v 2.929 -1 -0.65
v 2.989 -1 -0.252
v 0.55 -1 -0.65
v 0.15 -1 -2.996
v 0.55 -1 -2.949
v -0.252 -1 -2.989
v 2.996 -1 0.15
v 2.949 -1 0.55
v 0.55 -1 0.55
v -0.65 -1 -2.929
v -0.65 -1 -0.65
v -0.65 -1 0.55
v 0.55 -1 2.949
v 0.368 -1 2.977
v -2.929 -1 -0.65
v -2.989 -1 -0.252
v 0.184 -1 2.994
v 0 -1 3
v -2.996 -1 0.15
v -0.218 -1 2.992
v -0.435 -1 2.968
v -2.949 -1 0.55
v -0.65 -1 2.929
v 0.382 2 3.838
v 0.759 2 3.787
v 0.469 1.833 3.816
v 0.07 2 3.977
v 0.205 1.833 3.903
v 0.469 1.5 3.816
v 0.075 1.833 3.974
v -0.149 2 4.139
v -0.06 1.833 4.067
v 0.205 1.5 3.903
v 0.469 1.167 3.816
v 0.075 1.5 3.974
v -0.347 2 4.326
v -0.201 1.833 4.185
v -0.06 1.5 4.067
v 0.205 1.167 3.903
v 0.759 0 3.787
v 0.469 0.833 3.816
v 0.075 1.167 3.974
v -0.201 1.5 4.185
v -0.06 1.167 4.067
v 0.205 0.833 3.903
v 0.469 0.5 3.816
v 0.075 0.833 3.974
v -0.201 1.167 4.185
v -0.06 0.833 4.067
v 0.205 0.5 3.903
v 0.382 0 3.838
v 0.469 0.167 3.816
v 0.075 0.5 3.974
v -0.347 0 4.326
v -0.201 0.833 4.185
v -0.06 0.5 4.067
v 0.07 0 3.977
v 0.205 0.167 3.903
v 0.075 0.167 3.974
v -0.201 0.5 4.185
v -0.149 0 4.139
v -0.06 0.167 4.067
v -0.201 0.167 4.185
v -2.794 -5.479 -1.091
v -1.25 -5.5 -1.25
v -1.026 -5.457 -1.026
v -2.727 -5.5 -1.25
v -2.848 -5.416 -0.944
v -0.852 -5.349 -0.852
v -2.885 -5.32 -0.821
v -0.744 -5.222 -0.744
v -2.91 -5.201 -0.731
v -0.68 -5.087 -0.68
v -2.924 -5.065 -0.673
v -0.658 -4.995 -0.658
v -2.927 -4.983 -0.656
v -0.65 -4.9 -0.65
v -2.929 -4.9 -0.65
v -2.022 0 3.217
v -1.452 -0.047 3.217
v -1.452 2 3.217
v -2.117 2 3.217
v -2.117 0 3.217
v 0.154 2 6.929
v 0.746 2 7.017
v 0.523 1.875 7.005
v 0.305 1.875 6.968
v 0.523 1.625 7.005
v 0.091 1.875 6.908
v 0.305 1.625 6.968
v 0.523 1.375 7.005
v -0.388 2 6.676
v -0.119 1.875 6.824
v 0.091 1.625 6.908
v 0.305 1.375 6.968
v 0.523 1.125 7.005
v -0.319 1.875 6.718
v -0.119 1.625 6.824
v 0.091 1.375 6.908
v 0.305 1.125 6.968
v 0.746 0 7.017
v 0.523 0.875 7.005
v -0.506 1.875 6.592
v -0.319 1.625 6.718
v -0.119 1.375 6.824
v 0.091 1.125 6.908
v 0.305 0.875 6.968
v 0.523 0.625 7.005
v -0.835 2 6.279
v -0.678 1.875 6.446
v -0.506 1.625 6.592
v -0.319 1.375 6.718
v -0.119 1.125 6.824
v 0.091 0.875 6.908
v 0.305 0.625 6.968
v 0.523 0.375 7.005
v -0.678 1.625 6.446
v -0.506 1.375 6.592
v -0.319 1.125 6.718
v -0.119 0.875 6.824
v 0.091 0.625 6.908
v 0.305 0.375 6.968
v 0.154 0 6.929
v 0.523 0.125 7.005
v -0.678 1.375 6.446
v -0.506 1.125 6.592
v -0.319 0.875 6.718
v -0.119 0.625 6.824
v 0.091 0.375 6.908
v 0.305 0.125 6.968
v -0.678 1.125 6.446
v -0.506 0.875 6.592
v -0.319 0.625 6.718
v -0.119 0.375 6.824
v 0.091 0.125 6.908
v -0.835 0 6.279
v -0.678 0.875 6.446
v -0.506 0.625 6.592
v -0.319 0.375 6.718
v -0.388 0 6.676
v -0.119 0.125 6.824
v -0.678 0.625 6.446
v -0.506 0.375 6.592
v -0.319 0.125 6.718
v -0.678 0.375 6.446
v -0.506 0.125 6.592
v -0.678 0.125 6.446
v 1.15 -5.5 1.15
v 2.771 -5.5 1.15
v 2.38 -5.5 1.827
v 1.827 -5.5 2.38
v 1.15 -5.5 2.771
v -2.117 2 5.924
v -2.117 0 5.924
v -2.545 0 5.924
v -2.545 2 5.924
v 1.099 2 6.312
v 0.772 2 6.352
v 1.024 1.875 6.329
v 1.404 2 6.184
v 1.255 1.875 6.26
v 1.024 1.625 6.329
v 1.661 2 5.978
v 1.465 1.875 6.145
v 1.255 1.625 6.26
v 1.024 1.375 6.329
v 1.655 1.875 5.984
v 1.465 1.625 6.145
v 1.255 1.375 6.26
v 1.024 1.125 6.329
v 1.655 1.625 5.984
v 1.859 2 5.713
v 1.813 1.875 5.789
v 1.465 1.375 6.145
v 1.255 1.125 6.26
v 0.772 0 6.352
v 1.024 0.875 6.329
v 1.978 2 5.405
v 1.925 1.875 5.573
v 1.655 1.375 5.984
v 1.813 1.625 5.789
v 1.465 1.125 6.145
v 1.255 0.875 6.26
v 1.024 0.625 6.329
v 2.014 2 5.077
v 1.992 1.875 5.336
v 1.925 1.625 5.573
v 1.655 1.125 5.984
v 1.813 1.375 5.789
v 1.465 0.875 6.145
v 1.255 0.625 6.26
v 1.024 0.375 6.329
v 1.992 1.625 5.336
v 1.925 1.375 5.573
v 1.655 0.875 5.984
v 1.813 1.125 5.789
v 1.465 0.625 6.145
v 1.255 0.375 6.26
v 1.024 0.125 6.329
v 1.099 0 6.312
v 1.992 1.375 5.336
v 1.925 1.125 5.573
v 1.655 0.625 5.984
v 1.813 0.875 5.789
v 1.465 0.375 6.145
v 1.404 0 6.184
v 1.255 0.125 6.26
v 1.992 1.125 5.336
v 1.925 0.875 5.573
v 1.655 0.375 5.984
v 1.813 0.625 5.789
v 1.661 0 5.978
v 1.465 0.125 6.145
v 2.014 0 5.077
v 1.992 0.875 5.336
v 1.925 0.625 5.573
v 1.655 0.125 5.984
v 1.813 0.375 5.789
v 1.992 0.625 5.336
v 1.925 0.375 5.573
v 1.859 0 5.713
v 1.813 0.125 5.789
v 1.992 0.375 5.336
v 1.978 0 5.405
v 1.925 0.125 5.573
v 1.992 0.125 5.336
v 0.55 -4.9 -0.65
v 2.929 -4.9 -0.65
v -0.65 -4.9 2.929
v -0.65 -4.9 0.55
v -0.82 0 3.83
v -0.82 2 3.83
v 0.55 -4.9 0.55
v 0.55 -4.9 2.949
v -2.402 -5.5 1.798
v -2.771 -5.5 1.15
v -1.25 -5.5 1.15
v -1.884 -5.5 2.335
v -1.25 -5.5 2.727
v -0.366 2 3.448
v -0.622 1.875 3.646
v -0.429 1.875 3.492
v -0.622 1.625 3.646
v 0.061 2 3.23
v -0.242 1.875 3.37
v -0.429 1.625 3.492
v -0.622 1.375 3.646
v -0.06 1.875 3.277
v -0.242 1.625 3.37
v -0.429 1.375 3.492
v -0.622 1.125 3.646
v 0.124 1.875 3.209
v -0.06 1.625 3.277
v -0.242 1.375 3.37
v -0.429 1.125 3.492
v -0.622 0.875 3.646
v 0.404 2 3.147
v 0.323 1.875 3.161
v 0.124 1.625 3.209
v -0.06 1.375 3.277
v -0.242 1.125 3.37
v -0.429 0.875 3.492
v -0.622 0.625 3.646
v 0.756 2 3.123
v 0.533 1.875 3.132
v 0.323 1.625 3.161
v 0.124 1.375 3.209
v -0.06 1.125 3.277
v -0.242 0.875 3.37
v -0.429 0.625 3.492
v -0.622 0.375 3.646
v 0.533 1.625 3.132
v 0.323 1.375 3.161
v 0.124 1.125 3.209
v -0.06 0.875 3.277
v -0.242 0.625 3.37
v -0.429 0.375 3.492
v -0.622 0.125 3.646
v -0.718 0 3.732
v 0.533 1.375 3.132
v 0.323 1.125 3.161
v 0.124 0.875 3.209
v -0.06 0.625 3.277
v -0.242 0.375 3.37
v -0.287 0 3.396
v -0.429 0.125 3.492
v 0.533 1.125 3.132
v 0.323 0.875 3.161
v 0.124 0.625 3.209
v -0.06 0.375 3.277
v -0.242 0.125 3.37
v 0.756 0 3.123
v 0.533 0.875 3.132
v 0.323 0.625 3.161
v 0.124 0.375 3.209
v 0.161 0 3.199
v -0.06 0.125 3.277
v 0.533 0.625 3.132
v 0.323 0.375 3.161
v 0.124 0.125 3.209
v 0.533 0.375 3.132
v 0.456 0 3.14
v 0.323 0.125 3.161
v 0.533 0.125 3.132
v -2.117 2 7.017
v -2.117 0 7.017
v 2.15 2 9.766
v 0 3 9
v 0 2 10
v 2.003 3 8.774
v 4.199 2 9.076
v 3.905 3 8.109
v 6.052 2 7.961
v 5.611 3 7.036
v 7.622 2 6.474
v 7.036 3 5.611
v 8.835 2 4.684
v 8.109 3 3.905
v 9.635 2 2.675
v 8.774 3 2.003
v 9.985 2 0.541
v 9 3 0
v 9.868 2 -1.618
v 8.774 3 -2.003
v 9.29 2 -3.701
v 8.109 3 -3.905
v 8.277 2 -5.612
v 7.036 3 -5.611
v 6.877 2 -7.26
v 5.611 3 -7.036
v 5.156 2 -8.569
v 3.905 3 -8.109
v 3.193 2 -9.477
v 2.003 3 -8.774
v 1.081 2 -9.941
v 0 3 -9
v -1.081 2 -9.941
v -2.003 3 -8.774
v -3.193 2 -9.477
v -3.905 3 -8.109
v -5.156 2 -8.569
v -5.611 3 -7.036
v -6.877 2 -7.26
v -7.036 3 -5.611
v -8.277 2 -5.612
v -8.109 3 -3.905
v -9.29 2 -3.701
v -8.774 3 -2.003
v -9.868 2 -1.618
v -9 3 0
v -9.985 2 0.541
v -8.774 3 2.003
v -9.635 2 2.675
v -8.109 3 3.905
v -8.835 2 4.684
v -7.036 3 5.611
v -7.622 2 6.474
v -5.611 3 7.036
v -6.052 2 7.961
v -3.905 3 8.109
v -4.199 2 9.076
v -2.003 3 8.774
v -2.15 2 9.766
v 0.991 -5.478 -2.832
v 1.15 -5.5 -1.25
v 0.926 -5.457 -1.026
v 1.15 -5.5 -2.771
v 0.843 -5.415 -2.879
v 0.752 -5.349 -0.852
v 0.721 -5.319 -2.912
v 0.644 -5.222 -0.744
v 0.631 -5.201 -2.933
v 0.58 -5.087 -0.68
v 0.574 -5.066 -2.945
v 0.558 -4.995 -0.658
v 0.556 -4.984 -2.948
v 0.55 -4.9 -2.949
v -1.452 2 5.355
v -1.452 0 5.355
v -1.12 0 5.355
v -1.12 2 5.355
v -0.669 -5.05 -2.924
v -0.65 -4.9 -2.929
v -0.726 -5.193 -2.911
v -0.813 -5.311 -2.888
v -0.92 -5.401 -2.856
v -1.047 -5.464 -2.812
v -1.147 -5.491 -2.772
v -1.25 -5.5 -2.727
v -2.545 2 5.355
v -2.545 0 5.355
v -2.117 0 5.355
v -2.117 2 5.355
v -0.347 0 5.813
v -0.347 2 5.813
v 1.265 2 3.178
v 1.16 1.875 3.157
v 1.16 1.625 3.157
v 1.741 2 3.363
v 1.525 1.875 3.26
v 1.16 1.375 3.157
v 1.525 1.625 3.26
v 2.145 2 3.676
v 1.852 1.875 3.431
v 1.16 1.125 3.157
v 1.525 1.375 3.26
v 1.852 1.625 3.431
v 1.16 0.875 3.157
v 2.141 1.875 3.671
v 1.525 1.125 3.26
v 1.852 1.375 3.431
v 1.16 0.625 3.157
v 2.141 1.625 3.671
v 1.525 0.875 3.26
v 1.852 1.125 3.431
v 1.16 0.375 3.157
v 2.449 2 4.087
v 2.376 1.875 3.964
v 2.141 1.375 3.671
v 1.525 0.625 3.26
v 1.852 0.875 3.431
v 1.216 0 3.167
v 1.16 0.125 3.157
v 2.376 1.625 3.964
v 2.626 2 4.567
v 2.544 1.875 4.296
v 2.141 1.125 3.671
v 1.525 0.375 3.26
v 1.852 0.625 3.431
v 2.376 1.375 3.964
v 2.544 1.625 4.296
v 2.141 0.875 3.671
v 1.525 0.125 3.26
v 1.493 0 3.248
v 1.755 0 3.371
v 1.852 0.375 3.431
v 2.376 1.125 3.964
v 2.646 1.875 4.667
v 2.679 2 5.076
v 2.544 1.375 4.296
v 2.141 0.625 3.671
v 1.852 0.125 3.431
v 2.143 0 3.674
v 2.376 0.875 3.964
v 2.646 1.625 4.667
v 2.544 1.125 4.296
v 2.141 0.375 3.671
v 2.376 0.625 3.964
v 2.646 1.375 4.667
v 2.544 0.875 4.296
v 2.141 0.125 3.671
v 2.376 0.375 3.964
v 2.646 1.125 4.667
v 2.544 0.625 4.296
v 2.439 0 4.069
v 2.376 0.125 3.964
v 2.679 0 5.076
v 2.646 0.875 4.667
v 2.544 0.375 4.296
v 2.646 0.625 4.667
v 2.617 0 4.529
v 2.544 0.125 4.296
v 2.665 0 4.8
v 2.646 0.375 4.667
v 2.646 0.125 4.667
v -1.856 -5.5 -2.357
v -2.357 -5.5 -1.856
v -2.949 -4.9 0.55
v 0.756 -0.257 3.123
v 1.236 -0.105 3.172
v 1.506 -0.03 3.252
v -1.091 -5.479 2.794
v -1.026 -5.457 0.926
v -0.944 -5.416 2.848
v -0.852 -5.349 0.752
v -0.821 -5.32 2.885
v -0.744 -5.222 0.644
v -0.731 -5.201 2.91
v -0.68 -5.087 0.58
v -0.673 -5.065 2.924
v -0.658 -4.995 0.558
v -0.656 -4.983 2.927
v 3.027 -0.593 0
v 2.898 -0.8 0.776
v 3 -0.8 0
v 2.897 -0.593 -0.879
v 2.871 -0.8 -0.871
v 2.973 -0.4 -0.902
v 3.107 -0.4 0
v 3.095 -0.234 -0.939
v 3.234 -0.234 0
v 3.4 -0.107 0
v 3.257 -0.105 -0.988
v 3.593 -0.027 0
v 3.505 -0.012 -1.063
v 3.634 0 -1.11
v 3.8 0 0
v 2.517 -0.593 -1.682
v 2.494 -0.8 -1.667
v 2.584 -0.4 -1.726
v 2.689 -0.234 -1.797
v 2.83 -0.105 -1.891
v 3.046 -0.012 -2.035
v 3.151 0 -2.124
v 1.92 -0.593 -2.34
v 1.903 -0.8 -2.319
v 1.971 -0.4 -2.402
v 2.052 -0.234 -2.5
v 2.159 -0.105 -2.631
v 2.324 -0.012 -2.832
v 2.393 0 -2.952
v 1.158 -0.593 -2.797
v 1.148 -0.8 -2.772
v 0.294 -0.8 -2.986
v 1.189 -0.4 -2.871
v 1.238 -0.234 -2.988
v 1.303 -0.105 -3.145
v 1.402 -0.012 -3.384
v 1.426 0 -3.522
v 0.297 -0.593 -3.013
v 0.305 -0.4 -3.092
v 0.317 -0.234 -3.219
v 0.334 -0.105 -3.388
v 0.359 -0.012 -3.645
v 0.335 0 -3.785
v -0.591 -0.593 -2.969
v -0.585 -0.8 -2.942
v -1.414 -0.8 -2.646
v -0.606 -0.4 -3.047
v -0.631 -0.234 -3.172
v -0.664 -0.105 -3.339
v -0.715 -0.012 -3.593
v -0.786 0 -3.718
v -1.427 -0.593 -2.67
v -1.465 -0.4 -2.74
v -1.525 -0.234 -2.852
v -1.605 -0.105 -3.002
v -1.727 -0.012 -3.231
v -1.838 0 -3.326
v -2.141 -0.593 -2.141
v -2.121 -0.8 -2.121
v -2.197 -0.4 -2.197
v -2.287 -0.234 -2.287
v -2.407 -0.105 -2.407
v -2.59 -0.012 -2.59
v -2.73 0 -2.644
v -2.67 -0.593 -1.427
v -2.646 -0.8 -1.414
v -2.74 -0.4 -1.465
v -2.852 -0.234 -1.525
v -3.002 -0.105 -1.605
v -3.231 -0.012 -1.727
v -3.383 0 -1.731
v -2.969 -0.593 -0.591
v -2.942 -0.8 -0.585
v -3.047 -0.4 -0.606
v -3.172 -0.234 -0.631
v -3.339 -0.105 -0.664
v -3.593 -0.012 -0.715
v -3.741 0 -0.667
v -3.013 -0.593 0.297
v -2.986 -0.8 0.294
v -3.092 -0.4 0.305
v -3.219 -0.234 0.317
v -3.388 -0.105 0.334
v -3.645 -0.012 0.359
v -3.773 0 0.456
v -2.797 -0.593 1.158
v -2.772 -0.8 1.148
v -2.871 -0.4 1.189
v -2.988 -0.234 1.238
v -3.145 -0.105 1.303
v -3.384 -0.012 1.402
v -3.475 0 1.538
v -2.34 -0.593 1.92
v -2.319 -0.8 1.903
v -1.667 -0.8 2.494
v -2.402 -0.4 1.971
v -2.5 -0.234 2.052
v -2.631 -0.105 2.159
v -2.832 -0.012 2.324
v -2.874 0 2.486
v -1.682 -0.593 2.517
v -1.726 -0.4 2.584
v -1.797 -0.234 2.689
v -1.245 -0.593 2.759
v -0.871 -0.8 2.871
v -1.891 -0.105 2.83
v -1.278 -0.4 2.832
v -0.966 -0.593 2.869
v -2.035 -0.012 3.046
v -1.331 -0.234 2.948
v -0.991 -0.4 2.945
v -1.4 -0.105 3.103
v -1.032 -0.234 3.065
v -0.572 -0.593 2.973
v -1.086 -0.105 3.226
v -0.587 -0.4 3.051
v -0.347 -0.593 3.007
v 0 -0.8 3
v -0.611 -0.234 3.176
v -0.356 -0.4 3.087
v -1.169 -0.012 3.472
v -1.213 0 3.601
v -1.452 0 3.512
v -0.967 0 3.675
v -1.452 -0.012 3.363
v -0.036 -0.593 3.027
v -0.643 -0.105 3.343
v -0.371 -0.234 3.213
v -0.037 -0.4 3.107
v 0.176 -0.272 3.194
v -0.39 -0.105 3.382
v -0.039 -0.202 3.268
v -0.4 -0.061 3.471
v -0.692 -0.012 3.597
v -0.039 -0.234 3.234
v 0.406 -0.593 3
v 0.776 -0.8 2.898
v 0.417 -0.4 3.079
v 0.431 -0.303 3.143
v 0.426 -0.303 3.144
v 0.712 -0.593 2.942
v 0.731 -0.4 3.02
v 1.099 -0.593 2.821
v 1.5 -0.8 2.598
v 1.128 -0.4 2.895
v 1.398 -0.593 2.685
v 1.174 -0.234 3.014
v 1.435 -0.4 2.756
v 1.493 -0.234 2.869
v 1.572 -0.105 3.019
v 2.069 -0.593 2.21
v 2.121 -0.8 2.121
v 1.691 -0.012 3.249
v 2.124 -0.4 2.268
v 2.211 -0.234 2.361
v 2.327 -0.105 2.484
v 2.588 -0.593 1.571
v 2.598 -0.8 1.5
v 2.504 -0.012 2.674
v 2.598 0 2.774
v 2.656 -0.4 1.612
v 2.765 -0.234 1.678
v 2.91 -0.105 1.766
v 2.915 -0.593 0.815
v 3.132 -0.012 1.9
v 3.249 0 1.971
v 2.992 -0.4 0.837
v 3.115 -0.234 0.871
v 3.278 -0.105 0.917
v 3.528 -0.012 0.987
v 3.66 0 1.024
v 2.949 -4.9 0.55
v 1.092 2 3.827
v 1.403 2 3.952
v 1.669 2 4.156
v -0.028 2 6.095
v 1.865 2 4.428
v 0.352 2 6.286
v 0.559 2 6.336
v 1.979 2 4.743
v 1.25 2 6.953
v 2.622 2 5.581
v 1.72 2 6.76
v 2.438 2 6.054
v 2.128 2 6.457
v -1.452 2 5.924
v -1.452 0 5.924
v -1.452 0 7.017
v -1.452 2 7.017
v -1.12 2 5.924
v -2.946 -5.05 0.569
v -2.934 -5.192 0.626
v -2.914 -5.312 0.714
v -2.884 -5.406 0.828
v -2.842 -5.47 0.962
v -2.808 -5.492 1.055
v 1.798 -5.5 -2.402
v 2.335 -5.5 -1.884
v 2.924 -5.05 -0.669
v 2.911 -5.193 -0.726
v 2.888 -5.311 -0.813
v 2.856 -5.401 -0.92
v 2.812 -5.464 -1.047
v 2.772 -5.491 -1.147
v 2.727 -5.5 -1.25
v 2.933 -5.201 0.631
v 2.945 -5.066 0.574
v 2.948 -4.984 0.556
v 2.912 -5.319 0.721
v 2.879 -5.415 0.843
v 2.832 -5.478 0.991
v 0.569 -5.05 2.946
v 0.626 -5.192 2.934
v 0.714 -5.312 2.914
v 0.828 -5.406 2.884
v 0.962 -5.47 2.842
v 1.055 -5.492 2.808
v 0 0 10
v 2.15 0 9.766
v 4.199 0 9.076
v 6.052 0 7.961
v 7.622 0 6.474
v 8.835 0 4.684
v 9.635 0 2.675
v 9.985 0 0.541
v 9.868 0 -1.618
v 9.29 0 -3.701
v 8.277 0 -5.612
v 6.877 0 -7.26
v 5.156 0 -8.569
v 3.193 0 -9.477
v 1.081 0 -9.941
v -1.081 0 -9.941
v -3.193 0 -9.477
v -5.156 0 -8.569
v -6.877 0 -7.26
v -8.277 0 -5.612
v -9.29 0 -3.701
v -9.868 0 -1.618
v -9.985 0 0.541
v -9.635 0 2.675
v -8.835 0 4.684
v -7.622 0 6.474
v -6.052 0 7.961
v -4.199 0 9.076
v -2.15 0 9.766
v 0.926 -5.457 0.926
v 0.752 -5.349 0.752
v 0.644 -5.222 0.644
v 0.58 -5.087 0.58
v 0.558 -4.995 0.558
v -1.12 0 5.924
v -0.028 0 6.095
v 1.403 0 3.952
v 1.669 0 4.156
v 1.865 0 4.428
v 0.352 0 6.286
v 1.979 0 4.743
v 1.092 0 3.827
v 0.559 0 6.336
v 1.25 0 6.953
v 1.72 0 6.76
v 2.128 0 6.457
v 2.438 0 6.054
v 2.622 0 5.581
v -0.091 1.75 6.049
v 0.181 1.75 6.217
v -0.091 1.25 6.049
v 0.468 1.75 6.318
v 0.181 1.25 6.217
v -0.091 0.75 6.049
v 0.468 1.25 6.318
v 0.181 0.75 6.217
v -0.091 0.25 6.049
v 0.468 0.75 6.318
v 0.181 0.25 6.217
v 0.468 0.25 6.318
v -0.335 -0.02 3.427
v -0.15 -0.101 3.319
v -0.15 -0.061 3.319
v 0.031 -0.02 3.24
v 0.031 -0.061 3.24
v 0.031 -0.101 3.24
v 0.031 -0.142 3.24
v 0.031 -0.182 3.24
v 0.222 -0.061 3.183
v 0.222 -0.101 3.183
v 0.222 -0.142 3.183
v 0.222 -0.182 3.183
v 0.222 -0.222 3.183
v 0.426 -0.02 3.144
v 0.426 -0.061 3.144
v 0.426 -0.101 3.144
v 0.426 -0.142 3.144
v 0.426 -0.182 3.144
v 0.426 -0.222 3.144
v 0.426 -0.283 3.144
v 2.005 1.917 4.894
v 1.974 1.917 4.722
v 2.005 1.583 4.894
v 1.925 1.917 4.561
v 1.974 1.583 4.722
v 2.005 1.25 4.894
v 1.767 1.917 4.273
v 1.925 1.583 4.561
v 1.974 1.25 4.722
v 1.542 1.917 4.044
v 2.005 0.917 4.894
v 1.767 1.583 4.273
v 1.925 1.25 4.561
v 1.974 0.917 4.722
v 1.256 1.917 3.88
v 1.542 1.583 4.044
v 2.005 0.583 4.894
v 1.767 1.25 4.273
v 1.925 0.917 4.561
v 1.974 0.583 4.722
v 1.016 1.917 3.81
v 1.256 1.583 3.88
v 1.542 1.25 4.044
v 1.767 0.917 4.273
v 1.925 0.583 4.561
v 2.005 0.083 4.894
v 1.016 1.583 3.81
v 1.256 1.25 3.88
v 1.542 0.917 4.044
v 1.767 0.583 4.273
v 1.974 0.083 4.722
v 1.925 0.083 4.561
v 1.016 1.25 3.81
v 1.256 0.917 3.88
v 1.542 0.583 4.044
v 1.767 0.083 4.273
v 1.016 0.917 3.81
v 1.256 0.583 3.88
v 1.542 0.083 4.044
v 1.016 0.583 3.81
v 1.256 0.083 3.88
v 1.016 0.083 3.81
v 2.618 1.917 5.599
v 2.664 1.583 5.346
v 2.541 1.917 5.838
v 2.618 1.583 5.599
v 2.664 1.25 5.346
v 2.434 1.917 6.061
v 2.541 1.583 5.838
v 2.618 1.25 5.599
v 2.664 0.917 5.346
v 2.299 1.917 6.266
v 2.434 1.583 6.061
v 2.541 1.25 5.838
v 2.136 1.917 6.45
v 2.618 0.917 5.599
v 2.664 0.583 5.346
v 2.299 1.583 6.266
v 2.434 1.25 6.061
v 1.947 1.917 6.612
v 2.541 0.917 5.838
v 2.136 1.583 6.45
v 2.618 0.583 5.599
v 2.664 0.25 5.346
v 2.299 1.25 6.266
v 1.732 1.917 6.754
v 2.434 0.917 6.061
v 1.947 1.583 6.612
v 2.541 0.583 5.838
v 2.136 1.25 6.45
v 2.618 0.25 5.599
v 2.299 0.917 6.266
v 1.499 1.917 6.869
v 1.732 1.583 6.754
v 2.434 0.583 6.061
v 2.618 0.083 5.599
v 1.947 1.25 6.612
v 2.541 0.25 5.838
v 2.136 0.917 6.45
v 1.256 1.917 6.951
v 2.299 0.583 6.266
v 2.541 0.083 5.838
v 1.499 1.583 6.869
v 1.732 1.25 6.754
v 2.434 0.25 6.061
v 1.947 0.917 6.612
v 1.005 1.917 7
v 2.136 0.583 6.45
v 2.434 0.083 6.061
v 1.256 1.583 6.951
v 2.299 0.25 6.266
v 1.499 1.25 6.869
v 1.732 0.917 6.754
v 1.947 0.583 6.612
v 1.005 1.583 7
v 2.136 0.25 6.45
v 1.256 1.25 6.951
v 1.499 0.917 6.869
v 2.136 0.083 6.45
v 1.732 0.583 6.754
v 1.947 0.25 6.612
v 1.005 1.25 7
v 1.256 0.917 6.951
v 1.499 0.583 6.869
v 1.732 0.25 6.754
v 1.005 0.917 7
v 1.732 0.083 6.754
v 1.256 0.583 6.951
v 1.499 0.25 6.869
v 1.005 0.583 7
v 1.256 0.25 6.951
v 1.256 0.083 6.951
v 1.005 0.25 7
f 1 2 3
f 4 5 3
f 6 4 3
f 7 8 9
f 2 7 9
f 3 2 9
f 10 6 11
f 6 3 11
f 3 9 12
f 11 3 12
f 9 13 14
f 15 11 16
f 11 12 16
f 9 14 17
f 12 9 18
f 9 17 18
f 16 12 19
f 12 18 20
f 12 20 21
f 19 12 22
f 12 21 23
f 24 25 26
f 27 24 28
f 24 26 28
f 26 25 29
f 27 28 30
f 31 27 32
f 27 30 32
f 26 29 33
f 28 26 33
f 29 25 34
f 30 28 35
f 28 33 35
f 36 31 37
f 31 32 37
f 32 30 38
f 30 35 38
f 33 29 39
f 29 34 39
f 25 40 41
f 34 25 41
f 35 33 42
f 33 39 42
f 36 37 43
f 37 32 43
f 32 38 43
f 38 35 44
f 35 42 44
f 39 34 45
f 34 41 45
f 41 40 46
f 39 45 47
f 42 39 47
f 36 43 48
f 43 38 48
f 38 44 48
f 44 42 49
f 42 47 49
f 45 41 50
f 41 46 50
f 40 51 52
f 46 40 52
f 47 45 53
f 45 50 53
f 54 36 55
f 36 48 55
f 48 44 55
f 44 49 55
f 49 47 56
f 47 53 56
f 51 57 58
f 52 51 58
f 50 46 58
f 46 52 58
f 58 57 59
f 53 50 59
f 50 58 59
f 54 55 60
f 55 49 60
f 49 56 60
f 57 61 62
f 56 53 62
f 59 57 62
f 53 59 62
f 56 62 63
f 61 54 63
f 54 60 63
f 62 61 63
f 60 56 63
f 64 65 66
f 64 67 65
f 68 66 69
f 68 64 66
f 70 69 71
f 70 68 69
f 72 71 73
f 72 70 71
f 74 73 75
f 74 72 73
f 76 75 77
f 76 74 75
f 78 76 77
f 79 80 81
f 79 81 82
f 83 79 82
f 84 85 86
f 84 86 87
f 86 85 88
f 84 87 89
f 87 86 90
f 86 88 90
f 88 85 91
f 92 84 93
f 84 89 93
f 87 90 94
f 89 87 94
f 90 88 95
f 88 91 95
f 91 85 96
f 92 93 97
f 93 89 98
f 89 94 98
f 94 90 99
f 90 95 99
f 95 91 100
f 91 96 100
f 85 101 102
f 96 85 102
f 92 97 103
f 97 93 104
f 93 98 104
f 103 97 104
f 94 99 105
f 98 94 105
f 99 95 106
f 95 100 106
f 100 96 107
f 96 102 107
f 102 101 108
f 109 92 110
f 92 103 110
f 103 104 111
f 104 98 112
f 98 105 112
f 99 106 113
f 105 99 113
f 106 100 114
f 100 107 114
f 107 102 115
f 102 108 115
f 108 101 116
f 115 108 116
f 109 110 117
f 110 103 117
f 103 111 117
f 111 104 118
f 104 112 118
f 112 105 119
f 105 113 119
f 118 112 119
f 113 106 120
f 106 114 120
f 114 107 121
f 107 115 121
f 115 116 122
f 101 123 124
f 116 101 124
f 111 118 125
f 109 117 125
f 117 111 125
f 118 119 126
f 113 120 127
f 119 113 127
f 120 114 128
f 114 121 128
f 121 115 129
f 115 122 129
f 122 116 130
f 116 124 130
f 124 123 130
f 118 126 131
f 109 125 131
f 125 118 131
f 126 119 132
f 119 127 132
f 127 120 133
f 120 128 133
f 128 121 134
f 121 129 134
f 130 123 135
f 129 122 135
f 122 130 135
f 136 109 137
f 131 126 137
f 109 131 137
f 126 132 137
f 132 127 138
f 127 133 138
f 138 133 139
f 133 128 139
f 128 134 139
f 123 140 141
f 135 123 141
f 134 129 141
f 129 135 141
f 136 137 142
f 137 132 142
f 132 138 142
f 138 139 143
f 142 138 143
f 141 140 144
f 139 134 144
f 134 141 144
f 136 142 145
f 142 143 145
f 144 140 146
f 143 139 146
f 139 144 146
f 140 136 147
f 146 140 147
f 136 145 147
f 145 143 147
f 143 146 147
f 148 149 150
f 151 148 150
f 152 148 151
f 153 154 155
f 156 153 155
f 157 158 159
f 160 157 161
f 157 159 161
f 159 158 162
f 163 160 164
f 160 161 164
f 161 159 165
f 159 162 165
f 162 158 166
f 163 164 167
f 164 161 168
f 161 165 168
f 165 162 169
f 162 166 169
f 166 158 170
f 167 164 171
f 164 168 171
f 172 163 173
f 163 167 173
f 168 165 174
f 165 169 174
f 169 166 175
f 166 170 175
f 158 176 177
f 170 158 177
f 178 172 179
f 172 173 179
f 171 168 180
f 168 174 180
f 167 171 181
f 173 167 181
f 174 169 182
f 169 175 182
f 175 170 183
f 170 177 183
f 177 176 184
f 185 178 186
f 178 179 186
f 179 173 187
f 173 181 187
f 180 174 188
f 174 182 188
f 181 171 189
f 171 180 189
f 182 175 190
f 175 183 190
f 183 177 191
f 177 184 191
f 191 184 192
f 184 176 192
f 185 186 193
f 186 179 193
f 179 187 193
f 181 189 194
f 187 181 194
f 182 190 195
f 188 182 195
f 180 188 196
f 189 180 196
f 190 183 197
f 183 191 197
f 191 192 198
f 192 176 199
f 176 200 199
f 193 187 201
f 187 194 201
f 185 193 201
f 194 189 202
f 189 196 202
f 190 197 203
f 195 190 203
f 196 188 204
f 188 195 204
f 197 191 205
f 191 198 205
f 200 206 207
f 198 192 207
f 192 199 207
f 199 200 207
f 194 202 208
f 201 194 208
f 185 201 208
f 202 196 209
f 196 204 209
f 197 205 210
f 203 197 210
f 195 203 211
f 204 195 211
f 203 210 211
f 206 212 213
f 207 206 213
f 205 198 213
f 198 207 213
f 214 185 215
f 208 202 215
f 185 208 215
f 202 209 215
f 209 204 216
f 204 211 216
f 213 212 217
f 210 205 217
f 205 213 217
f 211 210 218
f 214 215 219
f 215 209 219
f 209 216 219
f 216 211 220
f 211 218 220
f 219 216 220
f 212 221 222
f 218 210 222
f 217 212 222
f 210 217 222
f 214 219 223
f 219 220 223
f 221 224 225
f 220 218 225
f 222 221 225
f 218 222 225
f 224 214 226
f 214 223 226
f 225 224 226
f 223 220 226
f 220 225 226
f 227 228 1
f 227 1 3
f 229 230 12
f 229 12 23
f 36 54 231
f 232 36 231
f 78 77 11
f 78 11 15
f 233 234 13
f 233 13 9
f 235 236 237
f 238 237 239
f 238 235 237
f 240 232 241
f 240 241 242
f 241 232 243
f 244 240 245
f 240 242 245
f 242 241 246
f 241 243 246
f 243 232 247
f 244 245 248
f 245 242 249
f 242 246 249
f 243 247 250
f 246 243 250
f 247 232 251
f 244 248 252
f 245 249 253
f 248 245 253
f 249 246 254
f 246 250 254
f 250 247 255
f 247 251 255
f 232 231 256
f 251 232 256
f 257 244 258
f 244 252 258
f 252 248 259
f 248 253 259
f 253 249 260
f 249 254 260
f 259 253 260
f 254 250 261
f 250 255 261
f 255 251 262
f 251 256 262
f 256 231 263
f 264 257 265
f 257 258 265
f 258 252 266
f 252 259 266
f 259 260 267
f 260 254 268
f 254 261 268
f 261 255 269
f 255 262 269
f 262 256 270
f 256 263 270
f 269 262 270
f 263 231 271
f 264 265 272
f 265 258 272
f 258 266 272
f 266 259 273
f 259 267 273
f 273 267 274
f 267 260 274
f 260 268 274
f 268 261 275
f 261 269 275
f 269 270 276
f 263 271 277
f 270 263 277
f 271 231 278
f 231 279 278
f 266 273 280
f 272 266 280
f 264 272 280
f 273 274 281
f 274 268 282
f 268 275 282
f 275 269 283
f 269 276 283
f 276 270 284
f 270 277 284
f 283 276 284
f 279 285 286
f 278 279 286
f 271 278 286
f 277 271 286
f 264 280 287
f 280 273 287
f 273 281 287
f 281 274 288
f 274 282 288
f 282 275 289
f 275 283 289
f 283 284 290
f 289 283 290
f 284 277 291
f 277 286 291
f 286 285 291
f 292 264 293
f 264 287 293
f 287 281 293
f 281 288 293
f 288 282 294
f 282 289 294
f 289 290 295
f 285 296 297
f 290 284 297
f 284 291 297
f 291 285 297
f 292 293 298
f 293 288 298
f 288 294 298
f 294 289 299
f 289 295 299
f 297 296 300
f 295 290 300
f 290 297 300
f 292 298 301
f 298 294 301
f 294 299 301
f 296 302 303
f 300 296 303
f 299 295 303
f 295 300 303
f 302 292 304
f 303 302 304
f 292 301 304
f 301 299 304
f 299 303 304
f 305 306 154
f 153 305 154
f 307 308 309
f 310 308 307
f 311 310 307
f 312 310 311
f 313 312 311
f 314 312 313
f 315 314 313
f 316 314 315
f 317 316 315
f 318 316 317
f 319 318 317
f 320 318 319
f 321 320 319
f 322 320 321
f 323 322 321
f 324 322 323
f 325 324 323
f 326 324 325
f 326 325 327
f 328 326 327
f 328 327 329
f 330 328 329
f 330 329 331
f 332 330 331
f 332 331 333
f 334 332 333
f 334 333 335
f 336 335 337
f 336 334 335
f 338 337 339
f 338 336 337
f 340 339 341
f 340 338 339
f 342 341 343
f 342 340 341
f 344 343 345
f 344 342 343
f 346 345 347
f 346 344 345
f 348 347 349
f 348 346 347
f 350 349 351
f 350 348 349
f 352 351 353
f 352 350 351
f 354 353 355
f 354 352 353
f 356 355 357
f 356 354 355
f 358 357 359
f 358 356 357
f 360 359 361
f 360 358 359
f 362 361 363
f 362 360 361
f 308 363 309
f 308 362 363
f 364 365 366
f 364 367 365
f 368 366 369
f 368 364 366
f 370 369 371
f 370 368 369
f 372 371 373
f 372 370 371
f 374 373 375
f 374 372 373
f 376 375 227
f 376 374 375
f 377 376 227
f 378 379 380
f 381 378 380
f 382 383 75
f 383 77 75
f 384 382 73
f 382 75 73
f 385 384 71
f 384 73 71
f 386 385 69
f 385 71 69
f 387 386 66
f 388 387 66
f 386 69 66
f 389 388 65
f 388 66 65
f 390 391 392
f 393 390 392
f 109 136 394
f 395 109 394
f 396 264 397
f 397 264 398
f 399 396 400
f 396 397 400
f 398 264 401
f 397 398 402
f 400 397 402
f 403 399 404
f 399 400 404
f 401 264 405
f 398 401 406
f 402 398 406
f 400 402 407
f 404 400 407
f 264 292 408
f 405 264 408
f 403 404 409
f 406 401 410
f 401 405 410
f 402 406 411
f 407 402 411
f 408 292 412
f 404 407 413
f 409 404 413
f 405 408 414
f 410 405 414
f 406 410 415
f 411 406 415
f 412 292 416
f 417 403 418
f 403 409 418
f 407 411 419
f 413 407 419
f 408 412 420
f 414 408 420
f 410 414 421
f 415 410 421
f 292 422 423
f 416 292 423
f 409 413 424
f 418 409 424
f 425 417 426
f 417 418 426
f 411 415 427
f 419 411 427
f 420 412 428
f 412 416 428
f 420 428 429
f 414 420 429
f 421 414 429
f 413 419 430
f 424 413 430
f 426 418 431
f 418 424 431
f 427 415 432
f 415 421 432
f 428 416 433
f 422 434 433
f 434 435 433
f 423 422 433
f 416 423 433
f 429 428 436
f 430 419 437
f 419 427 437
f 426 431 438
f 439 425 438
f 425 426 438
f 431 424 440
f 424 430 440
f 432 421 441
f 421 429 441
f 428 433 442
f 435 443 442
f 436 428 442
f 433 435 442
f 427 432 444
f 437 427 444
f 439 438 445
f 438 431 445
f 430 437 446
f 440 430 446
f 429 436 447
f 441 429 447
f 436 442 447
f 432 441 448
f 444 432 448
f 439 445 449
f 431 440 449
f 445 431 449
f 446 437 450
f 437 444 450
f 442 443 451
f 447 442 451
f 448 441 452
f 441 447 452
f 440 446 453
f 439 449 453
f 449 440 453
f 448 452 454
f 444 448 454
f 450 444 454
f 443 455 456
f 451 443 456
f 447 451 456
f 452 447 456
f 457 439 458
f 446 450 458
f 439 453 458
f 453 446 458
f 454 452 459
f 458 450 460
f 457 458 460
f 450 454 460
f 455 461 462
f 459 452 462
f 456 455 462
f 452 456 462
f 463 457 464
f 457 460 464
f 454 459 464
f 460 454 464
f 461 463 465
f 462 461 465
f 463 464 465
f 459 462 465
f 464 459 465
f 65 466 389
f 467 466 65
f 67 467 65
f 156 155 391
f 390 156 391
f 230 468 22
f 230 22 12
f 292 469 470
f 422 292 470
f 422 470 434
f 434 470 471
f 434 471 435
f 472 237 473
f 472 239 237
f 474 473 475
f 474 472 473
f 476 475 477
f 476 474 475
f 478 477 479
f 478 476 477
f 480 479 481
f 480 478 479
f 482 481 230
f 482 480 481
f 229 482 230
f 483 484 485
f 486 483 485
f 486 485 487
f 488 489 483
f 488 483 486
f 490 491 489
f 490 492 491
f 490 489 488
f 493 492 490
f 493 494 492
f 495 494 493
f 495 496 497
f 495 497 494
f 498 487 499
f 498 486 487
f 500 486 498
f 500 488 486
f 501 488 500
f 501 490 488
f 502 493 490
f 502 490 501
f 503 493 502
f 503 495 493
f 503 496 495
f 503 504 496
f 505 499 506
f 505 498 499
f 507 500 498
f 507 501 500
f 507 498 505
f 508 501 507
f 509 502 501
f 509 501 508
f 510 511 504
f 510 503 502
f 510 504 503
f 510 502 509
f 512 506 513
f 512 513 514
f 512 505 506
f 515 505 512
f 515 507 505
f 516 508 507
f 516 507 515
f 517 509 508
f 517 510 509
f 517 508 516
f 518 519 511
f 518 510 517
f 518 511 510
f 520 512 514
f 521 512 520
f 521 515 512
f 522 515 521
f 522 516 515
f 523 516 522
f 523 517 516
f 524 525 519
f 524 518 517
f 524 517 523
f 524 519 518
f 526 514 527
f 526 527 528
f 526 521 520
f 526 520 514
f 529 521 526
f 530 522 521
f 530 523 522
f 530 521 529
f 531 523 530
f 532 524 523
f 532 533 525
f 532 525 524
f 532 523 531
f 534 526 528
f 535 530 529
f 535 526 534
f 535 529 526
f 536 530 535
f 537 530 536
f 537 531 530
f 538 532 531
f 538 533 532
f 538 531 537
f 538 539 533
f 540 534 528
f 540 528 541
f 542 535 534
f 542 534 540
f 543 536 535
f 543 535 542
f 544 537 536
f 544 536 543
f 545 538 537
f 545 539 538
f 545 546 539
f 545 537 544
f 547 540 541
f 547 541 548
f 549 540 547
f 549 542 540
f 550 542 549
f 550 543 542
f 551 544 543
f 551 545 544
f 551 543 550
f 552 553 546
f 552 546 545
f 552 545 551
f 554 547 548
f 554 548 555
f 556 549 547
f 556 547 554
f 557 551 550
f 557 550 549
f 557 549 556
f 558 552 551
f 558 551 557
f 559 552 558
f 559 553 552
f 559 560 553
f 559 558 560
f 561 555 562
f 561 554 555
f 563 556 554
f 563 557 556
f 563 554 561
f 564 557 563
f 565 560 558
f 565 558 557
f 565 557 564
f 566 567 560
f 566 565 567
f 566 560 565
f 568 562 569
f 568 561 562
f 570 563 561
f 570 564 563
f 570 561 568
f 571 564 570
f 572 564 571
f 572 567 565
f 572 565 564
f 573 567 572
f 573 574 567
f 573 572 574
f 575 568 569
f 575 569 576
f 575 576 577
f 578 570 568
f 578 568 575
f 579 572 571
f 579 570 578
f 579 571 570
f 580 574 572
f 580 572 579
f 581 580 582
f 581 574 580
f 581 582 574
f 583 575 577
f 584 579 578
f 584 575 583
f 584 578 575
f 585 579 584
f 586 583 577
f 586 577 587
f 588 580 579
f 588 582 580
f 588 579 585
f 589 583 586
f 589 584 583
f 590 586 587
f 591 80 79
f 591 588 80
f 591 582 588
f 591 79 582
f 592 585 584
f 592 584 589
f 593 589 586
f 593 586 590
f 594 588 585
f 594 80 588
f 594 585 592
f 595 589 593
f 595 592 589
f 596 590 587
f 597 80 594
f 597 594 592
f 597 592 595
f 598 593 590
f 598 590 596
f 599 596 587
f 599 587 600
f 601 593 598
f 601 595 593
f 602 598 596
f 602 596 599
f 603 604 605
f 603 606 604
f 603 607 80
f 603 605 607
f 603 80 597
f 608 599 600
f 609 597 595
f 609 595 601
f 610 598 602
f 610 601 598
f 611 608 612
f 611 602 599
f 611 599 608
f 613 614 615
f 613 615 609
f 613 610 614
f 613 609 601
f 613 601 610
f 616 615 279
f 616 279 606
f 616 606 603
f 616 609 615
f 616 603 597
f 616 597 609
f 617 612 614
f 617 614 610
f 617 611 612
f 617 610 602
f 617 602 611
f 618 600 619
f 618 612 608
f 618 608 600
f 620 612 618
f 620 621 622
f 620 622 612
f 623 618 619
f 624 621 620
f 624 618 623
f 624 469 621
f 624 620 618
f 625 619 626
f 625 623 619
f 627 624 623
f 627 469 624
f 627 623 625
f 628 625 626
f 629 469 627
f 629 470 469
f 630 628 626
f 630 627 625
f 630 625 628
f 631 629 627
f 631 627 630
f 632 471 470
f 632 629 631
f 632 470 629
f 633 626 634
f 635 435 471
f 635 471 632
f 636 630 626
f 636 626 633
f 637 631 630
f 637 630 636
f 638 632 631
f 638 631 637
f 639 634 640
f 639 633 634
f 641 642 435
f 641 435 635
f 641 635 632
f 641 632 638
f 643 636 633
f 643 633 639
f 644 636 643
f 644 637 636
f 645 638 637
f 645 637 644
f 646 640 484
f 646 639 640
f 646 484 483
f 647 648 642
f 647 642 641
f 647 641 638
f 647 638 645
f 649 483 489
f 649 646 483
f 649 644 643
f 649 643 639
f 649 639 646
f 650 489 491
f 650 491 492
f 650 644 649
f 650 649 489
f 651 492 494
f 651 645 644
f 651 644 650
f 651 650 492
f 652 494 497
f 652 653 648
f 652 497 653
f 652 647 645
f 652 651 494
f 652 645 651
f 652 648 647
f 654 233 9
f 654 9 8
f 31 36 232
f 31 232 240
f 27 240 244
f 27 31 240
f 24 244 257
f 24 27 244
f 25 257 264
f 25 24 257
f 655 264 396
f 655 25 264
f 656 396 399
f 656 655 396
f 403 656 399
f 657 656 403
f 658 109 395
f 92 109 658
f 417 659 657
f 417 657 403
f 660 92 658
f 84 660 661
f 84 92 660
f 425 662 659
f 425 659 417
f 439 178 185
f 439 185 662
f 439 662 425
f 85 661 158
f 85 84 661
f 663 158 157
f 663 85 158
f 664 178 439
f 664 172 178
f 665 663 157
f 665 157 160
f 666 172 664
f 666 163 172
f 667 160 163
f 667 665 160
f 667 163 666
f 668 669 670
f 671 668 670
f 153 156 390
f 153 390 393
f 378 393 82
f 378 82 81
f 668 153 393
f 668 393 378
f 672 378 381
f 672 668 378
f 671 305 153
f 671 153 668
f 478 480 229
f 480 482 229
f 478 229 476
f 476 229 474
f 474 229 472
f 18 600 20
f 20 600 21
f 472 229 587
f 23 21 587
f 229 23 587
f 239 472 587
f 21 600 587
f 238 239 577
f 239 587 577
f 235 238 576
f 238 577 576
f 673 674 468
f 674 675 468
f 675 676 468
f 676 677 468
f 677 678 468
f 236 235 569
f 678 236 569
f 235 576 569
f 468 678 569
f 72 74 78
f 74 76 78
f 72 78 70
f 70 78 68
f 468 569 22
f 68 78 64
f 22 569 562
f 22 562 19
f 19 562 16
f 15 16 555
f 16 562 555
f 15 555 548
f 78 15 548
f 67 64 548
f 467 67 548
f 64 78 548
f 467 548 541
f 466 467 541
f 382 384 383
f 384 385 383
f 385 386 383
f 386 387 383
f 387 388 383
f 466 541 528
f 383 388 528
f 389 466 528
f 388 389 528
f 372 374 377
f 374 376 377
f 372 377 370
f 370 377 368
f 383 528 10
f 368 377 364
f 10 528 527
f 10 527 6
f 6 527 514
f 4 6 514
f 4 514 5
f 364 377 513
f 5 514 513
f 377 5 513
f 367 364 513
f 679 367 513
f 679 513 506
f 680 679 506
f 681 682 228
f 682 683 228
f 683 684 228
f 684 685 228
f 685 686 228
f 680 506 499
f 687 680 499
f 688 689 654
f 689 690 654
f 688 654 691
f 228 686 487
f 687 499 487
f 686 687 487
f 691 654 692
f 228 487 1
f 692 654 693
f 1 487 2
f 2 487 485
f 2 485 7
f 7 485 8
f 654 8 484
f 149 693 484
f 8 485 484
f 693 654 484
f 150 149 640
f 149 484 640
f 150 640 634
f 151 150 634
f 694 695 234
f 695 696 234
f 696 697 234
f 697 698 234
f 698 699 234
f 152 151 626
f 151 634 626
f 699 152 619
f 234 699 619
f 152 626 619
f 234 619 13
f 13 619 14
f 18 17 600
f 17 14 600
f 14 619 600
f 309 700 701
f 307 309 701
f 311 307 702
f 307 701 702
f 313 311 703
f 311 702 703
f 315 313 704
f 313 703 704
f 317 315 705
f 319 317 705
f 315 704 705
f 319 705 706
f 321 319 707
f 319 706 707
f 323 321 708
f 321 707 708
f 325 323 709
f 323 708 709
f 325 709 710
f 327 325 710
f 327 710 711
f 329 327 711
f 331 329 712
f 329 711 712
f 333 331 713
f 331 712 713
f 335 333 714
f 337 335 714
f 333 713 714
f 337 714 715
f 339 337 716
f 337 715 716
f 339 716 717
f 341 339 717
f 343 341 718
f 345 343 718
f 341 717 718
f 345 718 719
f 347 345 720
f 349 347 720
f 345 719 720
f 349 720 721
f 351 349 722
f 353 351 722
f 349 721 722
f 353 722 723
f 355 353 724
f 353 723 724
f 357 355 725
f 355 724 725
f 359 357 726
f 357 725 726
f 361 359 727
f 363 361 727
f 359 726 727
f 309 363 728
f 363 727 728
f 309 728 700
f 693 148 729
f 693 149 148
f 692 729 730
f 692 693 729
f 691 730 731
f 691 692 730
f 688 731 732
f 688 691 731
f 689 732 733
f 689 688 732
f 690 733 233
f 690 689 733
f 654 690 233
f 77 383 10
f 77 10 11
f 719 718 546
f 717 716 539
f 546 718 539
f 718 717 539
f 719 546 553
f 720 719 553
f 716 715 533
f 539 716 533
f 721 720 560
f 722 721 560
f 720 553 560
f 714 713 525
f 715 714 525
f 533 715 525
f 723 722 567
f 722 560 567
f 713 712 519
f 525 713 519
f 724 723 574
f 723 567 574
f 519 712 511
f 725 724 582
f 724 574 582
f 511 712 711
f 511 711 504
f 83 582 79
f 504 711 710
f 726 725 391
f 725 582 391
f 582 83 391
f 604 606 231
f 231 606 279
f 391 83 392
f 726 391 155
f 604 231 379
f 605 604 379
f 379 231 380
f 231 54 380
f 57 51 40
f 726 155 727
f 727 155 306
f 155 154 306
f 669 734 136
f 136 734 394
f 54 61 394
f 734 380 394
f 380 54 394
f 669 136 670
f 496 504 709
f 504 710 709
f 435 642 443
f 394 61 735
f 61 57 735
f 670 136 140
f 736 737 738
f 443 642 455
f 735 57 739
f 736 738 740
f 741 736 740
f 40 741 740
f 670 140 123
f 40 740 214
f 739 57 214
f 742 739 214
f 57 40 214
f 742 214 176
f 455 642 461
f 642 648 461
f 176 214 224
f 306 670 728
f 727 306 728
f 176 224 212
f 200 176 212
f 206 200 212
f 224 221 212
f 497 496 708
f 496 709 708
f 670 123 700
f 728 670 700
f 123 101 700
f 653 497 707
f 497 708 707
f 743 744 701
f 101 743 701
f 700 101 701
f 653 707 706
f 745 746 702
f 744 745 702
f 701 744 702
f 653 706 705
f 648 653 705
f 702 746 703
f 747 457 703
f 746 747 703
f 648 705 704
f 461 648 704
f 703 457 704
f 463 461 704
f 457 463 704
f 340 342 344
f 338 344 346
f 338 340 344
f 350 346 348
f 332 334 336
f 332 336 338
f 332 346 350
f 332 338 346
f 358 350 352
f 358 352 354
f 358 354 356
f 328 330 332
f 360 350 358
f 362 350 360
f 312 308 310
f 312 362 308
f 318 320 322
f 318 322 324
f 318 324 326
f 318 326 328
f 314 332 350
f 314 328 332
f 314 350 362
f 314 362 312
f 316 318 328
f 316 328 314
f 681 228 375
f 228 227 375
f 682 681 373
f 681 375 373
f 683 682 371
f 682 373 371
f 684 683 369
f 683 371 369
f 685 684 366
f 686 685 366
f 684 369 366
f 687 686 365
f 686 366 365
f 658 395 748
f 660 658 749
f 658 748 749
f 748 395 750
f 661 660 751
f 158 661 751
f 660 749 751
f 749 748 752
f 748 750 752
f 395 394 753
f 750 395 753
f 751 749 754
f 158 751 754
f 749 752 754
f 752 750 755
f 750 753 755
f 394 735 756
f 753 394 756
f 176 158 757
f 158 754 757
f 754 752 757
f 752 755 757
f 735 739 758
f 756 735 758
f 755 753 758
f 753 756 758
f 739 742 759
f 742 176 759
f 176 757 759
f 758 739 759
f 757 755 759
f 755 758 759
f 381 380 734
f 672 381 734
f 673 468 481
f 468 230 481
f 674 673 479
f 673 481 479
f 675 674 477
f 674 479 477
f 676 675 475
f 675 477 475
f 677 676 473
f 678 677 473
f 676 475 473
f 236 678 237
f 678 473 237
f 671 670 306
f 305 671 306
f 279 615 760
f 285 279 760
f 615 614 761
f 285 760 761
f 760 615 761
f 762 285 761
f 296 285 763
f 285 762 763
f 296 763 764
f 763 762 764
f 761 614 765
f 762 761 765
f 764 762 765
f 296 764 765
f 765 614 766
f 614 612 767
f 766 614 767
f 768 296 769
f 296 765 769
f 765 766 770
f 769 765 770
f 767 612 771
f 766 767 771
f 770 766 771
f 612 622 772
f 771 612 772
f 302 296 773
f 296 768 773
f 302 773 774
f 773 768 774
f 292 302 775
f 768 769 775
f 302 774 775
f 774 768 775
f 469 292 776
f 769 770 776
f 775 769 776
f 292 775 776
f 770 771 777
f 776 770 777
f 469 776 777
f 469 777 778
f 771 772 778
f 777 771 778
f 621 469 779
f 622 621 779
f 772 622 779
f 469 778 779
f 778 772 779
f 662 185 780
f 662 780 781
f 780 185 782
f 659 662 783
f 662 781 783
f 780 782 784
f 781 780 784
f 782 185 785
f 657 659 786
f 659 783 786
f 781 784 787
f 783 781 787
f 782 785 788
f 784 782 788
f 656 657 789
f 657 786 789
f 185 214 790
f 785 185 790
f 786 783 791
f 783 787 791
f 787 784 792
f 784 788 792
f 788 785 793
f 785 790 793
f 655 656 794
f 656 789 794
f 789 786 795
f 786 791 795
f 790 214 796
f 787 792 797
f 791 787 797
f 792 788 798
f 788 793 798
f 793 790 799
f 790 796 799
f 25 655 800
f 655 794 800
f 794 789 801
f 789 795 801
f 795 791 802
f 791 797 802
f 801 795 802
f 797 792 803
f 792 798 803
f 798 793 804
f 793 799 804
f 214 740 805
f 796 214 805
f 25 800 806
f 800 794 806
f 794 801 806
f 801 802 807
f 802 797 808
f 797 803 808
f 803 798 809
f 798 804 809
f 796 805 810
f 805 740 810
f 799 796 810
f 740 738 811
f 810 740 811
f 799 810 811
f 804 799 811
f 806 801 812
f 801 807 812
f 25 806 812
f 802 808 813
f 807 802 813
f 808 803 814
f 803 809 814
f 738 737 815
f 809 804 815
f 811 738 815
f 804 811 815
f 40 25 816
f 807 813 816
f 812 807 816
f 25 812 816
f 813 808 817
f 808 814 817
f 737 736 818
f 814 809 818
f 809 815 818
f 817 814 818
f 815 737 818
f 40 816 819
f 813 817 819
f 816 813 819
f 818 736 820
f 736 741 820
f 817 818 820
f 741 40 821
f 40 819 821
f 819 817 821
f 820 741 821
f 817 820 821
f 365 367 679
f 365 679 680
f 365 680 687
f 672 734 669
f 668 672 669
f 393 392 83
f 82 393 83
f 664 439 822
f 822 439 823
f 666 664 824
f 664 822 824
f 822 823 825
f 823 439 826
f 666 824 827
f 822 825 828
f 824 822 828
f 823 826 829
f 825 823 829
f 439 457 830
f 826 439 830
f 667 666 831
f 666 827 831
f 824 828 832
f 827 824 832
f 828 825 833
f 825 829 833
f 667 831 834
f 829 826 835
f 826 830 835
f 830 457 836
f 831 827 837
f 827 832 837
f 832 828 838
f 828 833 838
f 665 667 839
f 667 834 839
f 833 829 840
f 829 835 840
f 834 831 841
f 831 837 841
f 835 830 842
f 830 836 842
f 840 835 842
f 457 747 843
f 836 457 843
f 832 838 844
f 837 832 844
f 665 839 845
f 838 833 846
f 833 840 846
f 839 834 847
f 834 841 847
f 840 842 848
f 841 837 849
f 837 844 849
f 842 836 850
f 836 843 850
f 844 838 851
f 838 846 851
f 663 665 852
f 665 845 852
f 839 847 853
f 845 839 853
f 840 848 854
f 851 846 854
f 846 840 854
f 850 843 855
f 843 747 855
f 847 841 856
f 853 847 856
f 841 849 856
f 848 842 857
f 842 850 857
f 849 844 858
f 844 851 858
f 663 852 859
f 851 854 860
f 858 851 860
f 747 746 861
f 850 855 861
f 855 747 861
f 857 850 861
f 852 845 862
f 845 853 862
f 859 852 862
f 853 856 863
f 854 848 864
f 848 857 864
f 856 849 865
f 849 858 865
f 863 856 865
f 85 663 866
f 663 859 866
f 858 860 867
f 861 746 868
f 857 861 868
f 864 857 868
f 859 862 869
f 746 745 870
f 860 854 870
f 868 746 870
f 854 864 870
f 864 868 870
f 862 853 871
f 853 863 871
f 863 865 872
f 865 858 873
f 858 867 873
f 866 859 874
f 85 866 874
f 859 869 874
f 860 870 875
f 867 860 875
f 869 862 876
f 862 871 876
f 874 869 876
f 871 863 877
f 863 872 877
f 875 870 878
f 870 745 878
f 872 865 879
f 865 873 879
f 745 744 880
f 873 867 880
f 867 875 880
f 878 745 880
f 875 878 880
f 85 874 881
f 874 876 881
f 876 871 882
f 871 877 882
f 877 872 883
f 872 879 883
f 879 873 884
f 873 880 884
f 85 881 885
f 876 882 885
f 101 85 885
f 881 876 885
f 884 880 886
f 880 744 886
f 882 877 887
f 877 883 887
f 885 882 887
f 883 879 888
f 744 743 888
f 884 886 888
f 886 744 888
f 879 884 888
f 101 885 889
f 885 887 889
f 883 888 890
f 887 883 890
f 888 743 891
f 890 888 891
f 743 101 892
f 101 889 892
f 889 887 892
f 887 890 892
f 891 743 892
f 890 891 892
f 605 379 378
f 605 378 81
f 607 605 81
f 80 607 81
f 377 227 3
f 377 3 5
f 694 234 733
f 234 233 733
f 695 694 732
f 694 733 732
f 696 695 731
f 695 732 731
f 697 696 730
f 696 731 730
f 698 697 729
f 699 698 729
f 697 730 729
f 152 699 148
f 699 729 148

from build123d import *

# Parameters (mm, degrees)
SKETCH1_R           = 10
BOSS_EXTRUDE1_DEPTH = 3
SKETCH2_R           = 3
BOSS_EXTRUDE2_DEPTH = 5.5
CUT_EXTRUDE1_DEPTH  = 4.5
CUT_EXTRUDE2_DEPTH  = 2
FILLET3_R           = 0.6
CHAMFER1_SIZE       = 1
FILLET4_START       = -0.303359817
FILLET4_2_DEPTH     = 0.303359817


with BuildPart() as part:
    # Sketch1 → Boss-Extrude1 (new body)
    with BuildSketch(Plane(origin=(0, 0, 0), x_dir=(1, 0, 0), z_dir=(0, 1, 0))):
        with Locations(Location((0, 0, 0), (0, 0, 270))):
            Circle(SKETCH1_R)
    extrude(amount=BOSS_EXTRUDE1_DEPTH)

    # Sketch2 → Boss-Extrude2 (add)
    with BuildSketch(Plane.XZ):
        with Locations(Location((0, 0, 0), (0, 0, 90))):
            Circle(SKETCH2_R)
    extrude(amount=BOSS_EXTRUDE2_DEPTH)

    # Sketch3 → Cut-Extrude1 (cut)
    with BuildSketch(Plane.XZ.offset(5.5)):
        Polygon((0.55, 0.55), (5.536201487, 0.55), (5.536201487, -0.65), (0.55, -0.65), (0.55, -5.164287365), (-0.65, -5.164287365), (-0.65, -0.65), (-5.536201487, -0.65), (-5.536201487, 0.55), (-0.65, 0.55), (-0.65, 5.164287365), (0.55, 5.164287365), align=None)
    extrude(amount=-CUT_EXTRUDE1_DEPTH, mode=Mode.SUBTRACT)

    # Sketch4 → Cut-Extrude2 (cut)
    with BuildSketch(Plane.XZ):
        with BuildLine():
            Line((-0.834967988, 6.279069136), (-0.347460476, 5.81308022))
            add(Edge.make_bspline(
                [(-0.347460476, 5.81308022), (-0.306106117, 5.855840696), (-0.225328099, 5.939365303), (-0.095164312, 6.049944522), (0.040201287, 6.142097338), (0.178135431, 6.219707854), (0.321119155, 6.27842574), (0.467499177, 6.321214453), (0.618210178, 6.347301114), (0.720205587, 6.350285889), (0.771506538, 6.351787151)],
                knots=[0, 0, 0, 0, 1.115251505, 2.178435587, 3.19620269, 4.182487026, 5.141301733, 6.088180966, 7.038406374, 8, 8, 8, 8], degree=3))
            add(Edge.make_bspline(
                [(0.771506538, 6.351787151), (0.814349066, 6.350601102), (0.898894076, 6.348260564), (1.023028305, 6.331102112), (1.14176911, 6.301923419), (1.255522961, 6.261709774), (1.363955131, 6.209675452), (1.467292962, 6.145860726), (1.565281679, 6.070841933), (1.656626907, 5.985007225), (1.740186311, 5.891226356), (1.814016366, 5.791162393), (1.87586088, 5.685044577), (1.926615666, 5.57394759), (1.966151683, 5.45735722), (1.994385366, 5.335351962), (2.010714974, 5.207786517), (2.013152277, 5.121068477), (2.014390986, 5.076995818)],
                knots=[0, 0, 0, 0, 1.035432265, 2.043311493, 3.022114605, 3.98653278, 4.95457646, 5.923598177, 6.917315552, 7.932509744, 8.948865224, 9.949768934, 10.933144597, 11.912367597, 12.897413939, 13.903909035, 14.934704909, 16, 16, 16, 16], degree=3))
            add(Edge.make_bspline(
                [(2.014390986, 5.076995818), (2.014034004, 5.046062543), (2.013330386, 4.985092421), (2.005628036, 4.89490069), (1.993225435, 4.807393388), (1.9752758, 4.722703065), (1.952829605, 4.64075633), (1.926495106, 4.56084623), (1.893458866, 4.484076944), (1.85678814, 4.409556847), (1.814140509, 4.339319312), (1.768158495, 4.272341994), (1.718298508, 4.208953207), (1.664237603, 4.149412088), (1.605214938, 4.094649132), (1.542756032, 4.04301755), (1.47580729, 3.995809856), (1.405759405, 3.95184132), (1.332007254, 3.91364548), (1.256551903, 3.879047428), (1.178249297, 3.850948665), (1.098052816, 3.828298499), (1.016249056, 3.809037916), (0.932037899, 3.797178583), (0.84614935, 3.788197649), (0.788103108, 3.787643128), (0.758892188, 3.787364074)],
                knots=[0, 0, 0, 0, 1.103660481, 2.175337485, 3.227646561, 4.255952547, 5.262355991, 6.258840057, 7.255597736, 8.242457506, 9.22035537, 10.185017736, 11.140346927, 12.096287581, 13.051739095, 14.01125915, 14.986044842, 15.97314143, 16.960198552, 17.947847494, 18.933482797, 19.925264591, 20.920966487, 21.929612487, 22.958107872, 24, 24, 24, 24], degree=3))
            add(Edge.make_bspline(
                [(0.758892188, 3.787364074), (0.709345449, 3.788797229), (0.611998989, 3.791613005), (0.469129063, 3.813631976), (0.332988257, 3.849851938), (0.224212405, 3.892625607), (0.138989397, 3.934865162), (0.074110382, 3.973934669), (0.007020423, 4.017638203), (-0.061166173, 4.067625182), (-0.131216368, 4.123295742), (-0.201893616, 4.185869172), (-0.275007267, 4.253285019), (-0.322903296, 4.301401034), (-0.347460476, 4.326071005)],
                knots=[0, 0, 0, 0, 1.404581149, 2.759636711, 4.088442092, 5.392261763, 6.066678138, 6.783632037, 7.538459478, 8.336747902, 9.180226004, 10.074962426, 11.012997595, 12, 12, 12, 12], degree=3))
            Line((-0.347460476, 4.326071005), (-0.820127577, 3.829659247))
            add(Edge.make_bspline(
                [(-0.820127577, 3.829659247), (-0.786901624, 3.797580632), (-0.722051669, 3.734970037), (-0.624227313, 3.646068834), (-0.526526072, 3.56618122), (-0.431308206, 3.492407626), (-0.337013946, 3.426897254), (-0.243653292, 3.36958468), (-0.152283128, 3.319020385), (-0.061006122, 3.276057111), (0.030745698, 3.239576829), (0.125147538, 3.208169701), (0.222487994, 3.181600401), (0.323361577, 3.160162465), (0.426827399, 3.142972134), (0.533853763, 3.13136876), (0.64376207, 3.123568198), (0.718314577, 3.122867253), (0.755924106, 3.122513647)],
                knots=[0, 0, 0, 0, 1.244526981, 2.429050516, 3.560637417, 4.644440555, 5.67424972, 6.652764056, 7.595344123, 8.486817594, 9.369275933, 10.254498637, 11.166417451, 12.086725134, 13.032340136, 13.991389299, 14.986715468, 16, 16, 16, 16], degree=3))
            add(Edge.make_bspline(
                [(0.755924106, 3.122513647), (0.825008152, 3.124274737), (0.960186427, 3.127720701), (1.158286664, 3.15325296), (1.346476572, 3.196057342), (1.525213981, 3.256594544), (1.694442057, 3.333927983), (1.854117507, 3.428735148), (2.003982968, 3.540764151), (2.142827823, 3.668701904), (2.268419602, 3.809998412), (2.379428191, 3.961712098), (2.4712545, 4.124588579), (2.547499862, 4.29622165), (2.607122733, 4.477394539), (2.649087127, 4.668303219), (2.674966262, 4.868763357), (2.677797476, 5.005682252), (2.679241414, 5.075511777)],
                knots=[0, 0, 0, 0, 1.078019885, 2.10938526, 3.111377082, 4.085535484, 5.04941344, 6.010039228, 6.978205633, 7.964457913, 8.951525778, 9.924444315, 10.892603023, 11.863865945, 12.85144698, 13.863884204, 14.910567087, 16, 16, 16, 16], degree=3))
            add(Edge.make_bspline(
                [(2.679241414, 5.075511777), (2.678631276, 5.121053998), (2.677422131, 5.211307547), (2.664713911, 5.344258338), (2.646997912, 5.473861578), (2.618893092, 5.598771556), (2.585015503, 5.720671039), (2.54288427, 5.838235123), (2.492566683, 5.951801699), (2.435684595, 6.061560883), (2.371334459, 6.166793637), (2.299448292, 6.266595843), (2.221876725, 6.361737958), (2.136755839, 6.450957744), (2.045322553, 6.535038569), (1.947164056, 6.613524781), (1.842870722, 6.687541963), (1.732160268, 6.755181391), (1.617183502, 6.816364849), (1.499390586, 6.870331271), (1.379070921, 6.915434773), (1.256733231, 6.952846464), (1.13186064, 6.980771646), (1.005344457, 7.001910108), (0.876108181, 7.013726643), (0.789337218, 7.015661085), (0.745535818, 7.016637579)],
                knots=[0, 0, 0, 0, 1.071919942, 2.124283339, 3.142214191, 4.149696895, 5.136002878, 6.119640489, 7.086990633, 8.058538607, 9.028339693, 9.988281803, 10.952401235, 11.916291999, 12.888973767, 13.874849856, 14.873389453, 15.898127285, 16.927174885, 17.938320013, 18.946391617, 19.950418109, 20.947802303, 21.956882652, 22.968648068, 24, 24, 24, 24], degree=3))
            add(Edge.make_bspline(
                [(0.745535818, 7.016637579), (0.708168733, 7.016077828), (0.633823076, 7.014964147), (0.523109917, 7.005680404), (0.41328219, 6.99110038), (0.304733111, 6.969102228), (0.196686228, 6.942987643), (0.090561397, 6.908794195), (-0.015315558, 6.870679153), (-0.119284115, 6.825120403), (-0.221489399, 6.775388913), (-0.319537089, 6.718966731), (-0.415073398, 6.659326016), (-0.505981298, 6.592936968), (-0.59396369, 6.522207642), (-0.678560506, 6.446808046), (-0.75902936, 6.365481048), (-0.809527145, 6.308018722), (-0.834967988, 6.279069136)],
                knots=[0, 0, 0, 0, 0.996412454, 1.982464992, 2.961075852, 3.949442424, 4.934965278, 5.923860011, 6.921385422, 7.934793307, 8.949617135, 9.951082467, 10.950285876, 11.951772932, 12.951063433, 13.960125323, 14.972308753, 16, 16, 16, 16], degree=3))
        make_face()
        Polygon((-1.452329099, 7.016637579), (-2.117179526, 7.016637579), (-2.117179526, 5.924383305), (-2.544583373, 5.924383305), (-2.544583373, 5.35451151), (-2.117179526, 5.35451151), (-2.117179526, 3.217492279), (-1.452329099, 3.217492279), (-1.452329099, 5.35451151), (-1.119903885, 5.35451151), (-1.119903885, 5.924383305), (-1.452329099, 5.924383305), align=None)
    extrude(amount=-CUT_EXTRUDE2_DEPTH, mode=Mode.SUBTRACT)

    # Fillet3
    fillet3_edges = [part.edges().sort_by_distance(p)[0] for p in [
        (1.74957621, -5.5, 0.55),
        (-0.65, -5.5, 1.739368465),
        (-1.789368465, -5.5, -0.65),
        (0.55, -5.5, -1.79957621),
        (0.55, -5.5, 1.74957621),
        (-1.79957621, -5.5, 0.55),
        (-0.65, -5.5, -1.789368465),
        (1.739368465, -5.5, -0.65),
    ]]
    fillet(fillet3_edges, radius=FILLET3_R)

    # Chamfer1
    chamfer1_edges = [part.edges().sort_by_distance(p)[0] for p in [
        (0, 3, -10),
    ]]
    chamfer(chamfer1_edges, length=CHAMFER1_SIZE)

    # Fillet4: read off the stored shape, not the designer's step
    # Fillet4 outline → Fillet4 (revolve)
    with BuildSketch(Plane.XY):
        with BuildLine():
            ThreePointArc((3, -0.8), (3.234314575, -0.234314575), (3.8, 0))
            Line((3.8, 0), (3, 0))
            Line((3, 0), (3, -0.8))
        make_face()
    revolve(axis=Axis((0, 0, 0), (0, 1, 0)))

    # Fillet4 2 outline → Fillet4 2 (cut)
    with BuildSketch(Plane(origin=(0, 0, 0), x_dir=(1, 0, 0), z_dir=(0, 1, 0)).offset(FILLET4_START)):
        with BuildLine():
            Line((-1.452329099, -3.511515369), (-1.452329099, -3.217492279))
            Line((-1.452329099, -3.217492279), (-2.021816864, -3.217492279))
            ThreePointArc((-2.021816864, -3.217492279), (-1.743282805, -3.376531514), (-1.452329099, -3.511515369))
        make_face()
        with BuildLine():
            add(Edge.make_bspline(
                [(-0.717504439, -3.731646738), (-0.686203446, -3.702392774), (-0.623361366, -3.645360773), (-0.526526072, -3.56618122), (-0.431308206, -3.492407626), (-0.337013946, -3.426897254), (-0.243653292, -3.36958468), (-0.152283128, -3.319020385), (-0.061006122, -3.276057111), (0.030745698, -3.239576829), (0.125147538, -3.208169701), (0.222487994, -3.181600401), (0.323361577, -3.160162465), (0.426827399, -3.142972134), (0.533853763, -3.13136876), (0.64376207, -3.123568198), (0.718314577, -3.122867253), (0.755924106, -3.122513647)],
                knots=[0.079666321, 0.079666321, 0.079666321, 0.079666321, 0.151815657, 0.222539839, 0.290277535, 0.354640607, 0.415797753, 0.474709008, 0.5304261, 0.585579746, 0.640906165, 0.697901091, 0.755420321, 0.814521258, 0.874461831, 0.936669717, 1, 1, 1, 1], degree=3))
            ThreePointArc((-0.717504439, -3.731646738), (0.549009685, -3.760131429), (1.754506577, -3.370713081))
            add(Edge.make_bspline(
                [(0.755924106, -3.122513647), (0.825008152, -3.124274737), (0.960186427, -3.127720701), (1.158286664, -3.15325296), (1.346476572, -3.196057342), (1.525213981, -3.256594544), (1.659634947, -3.318021913), (1.73426641, -3.359048476), (1.754506577, -3.370713081)],
                knots=[0, 0, 0, 0, 0.067376243, 0.131836579, 0.194461068, 0.255345968, 0.31558834, 0.33836485, 0.33836485, 0.33836485, 0.33836485], degree=3))
        make_face()
    extrude(amount=FILLET4_2_DEPTH, mode=Mode.SUBTRACT)


solid = part.part
